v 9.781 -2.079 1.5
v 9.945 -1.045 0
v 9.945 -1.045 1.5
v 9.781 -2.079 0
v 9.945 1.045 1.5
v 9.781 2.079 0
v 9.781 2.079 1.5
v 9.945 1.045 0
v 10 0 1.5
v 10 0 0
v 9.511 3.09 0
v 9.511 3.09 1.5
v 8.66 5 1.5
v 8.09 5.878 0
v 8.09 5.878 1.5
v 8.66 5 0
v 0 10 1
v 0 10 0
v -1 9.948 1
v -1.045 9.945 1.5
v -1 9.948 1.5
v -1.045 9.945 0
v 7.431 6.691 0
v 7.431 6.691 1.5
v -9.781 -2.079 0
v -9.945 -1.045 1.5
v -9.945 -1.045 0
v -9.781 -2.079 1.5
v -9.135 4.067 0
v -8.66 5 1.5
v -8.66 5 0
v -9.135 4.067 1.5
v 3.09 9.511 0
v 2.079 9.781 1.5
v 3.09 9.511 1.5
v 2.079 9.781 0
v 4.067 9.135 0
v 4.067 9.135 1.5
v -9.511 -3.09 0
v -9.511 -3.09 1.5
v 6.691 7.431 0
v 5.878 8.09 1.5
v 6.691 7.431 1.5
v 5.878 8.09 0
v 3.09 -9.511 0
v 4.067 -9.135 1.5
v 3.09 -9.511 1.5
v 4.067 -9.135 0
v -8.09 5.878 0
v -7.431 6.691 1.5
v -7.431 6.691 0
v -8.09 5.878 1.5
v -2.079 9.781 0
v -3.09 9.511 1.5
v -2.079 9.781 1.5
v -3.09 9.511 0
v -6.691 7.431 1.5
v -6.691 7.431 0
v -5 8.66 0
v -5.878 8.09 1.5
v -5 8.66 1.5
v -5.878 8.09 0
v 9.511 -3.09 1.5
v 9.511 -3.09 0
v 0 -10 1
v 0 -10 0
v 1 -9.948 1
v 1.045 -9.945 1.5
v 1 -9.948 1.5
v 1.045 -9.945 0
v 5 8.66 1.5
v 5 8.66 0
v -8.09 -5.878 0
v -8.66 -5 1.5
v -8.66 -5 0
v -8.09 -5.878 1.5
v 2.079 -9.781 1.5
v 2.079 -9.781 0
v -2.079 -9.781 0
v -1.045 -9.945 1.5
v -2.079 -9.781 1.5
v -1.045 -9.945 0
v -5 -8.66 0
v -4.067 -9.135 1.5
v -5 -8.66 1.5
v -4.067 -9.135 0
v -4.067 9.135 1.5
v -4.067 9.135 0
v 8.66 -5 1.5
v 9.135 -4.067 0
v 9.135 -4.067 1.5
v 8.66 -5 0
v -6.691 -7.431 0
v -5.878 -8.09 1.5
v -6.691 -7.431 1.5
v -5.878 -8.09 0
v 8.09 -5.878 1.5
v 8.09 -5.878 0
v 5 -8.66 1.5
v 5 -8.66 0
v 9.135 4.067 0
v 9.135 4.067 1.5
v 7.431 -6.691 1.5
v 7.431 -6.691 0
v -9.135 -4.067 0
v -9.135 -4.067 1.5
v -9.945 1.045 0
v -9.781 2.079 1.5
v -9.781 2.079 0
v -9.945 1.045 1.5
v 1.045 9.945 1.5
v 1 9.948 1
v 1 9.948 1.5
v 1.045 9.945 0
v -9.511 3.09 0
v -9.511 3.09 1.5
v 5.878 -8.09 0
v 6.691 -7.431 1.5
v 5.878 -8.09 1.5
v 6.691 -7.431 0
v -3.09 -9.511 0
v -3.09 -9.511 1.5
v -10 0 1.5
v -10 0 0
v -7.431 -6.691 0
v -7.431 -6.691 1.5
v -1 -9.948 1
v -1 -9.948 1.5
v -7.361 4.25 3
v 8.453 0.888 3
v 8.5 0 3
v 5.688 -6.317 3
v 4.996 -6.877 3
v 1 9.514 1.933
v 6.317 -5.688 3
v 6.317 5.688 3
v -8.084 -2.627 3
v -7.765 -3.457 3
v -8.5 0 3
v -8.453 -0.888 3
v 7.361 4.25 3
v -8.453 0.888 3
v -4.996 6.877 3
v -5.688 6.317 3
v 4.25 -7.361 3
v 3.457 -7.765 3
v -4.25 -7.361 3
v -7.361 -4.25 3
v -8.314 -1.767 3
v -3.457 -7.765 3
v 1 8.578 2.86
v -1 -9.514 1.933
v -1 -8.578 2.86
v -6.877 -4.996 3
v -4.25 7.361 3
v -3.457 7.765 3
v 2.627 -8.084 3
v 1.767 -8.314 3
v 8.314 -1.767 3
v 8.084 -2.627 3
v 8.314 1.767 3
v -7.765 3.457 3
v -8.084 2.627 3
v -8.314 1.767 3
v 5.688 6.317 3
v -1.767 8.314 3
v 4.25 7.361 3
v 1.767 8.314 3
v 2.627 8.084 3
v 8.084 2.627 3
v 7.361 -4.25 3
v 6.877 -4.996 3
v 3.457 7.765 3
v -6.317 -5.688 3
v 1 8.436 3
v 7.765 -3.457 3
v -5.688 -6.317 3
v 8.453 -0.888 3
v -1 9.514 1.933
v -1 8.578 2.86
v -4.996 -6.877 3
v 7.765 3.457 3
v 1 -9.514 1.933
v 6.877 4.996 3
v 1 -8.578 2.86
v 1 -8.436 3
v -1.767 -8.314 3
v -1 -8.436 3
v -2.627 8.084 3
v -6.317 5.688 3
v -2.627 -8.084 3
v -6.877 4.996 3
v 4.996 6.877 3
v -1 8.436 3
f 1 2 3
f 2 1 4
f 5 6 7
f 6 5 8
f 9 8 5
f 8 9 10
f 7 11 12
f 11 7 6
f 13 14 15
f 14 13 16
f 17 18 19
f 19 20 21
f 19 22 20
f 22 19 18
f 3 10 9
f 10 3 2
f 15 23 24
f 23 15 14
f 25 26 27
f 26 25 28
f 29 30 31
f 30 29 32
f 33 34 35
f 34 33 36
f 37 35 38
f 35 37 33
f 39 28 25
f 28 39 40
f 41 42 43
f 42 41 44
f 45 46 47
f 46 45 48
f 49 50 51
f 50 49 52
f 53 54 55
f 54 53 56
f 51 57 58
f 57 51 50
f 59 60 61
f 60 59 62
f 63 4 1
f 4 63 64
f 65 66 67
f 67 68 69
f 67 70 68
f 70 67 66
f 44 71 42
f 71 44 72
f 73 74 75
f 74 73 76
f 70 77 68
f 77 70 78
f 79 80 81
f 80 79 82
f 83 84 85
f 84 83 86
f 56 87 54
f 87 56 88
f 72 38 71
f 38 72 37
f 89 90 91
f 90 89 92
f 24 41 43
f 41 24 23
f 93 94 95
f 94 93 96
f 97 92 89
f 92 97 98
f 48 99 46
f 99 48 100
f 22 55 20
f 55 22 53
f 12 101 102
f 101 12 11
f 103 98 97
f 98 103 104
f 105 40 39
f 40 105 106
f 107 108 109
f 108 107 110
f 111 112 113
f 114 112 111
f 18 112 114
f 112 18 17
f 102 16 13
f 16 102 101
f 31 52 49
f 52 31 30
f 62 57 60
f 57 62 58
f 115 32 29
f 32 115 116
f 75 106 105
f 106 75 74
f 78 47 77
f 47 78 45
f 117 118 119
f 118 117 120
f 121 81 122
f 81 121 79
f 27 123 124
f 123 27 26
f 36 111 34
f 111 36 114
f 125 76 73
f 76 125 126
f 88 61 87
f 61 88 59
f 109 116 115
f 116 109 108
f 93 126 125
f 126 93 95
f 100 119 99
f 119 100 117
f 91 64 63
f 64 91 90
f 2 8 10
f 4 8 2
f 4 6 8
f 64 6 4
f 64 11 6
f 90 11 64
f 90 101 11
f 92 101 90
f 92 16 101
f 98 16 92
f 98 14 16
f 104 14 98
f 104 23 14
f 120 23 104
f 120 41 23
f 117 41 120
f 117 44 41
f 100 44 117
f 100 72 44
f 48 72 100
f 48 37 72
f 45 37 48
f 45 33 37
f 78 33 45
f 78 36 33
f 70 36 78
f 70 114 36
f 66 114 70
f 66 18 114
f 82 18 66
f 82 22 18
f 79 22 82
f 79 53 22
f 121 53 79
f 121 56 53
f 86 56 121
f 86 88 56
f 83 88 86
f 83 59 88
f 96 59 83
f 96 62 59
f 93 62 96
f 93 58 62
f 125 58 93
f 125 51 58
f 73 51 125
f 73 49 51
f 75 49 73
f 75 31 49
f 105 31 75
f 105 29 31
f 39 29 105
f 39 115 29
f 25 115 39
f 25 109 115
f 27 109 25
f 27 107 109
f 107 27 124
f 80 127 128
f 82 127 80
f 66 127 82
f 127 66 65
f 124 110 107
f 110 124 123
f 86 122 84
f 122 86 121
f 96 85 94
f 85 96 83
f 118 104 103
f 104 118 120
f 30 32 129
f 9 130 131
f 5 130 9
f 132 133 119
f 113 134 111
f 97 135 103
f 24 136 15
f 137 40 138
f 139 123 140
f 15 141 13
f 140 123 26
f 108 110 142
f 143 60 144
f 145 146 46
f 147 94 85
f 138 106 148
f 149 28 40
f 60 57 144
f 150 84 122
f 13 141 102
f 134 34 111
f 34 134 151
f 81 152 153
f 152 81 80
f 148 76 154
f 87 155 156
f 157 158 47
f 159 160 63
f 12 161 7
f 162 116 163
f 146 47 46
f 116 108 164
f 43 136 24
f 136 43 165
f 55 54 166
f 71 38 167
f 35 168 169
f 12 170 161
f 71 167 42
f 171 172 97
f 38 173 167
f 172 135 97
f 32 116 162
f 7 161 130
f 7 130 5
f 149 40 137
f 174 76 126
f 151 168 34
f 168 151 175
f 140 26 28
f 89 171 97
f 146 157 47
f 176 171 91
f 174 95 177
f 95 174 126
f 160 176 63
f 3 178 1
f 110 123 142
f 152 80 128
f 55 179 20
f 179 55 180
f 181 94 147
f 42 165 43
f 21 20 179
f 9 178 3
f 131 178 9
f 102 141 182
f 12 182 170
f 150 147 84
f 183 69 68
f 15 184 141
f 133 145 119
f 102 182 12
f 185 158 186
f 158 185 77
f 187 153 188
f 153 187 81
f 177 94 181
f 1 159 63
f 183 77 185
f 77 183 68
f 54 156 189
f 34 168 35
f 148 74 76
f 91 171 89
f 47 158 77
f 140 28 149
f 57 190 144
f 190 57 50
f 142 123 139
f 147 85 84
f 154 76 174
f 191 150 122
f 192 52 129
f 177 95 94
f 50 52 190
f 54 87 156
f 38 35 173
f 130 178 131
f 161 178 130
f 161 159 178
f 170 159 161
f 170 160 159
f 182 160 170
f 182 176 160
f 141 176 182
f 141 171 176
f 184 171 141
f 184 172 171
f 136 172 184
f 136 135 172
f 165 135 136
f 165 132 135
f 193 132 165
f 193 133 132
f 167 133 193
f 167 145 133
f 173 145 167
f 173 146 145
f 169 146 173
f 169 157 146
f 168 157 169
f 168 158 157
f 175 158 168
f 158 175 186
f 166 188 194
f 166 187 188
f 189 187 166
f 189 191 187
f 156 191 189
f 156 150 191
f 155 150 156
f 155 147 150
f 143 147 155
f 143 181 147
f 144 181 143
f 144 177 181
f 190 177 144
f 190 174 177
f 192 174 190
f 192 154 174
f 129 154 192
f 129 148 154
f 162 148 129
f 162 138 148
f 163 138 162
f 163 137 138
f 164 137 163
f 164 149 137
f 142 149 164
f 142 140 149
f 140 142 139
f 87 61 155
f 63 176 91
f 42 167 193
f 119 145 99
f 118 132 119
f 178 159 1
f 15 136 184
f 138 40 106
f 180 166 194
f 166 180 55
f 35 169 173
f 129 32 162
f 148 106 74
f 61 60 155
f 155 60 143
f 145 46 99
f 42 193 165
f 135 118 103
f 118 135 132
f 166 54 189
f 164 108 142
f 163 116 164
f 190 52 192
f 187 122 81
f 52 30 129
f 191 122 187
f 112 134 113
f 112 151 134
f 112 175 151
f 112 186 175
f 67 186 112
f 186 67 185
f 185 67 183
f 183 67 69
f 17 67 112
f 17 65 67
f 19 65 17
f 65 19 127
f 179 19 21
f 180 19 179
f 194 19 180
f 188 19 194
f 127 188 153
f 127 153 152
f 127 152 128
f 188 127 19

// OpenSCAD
// Title: Mini Base
// Author: http://www.thingiverse.com/Jinja
// Date: 29/12/2016

/////////// START OF PARAMETERS /////////////////


base_diam = 20; // [10:Tiny, 20:Medium, 40:Large, 60:Huge: 80:Gargantuan]
slot_width = 2;
//base_diam = 20;
//base_diam = 10;
multi_slots = 0; // [1:MultiSlots, 0:SingleSlot]

base_or_mini = 0; // [0:Base, 1:Mini]

//silhouette_filename = "minibase40_bear.dat"; // [image_surface:100x100]
//silhouette_filename = "minibase40_spider.dat"; // [image_surface:100x100]
//silhouette_filename = "minibase40_wolf.dat"; // [image_surface:100x100]
//silhouette_filename = "minibase40_warhorse.dat"; // [image_surface:100x100]
//silhouette_filename = "minibase40_tiger.dat"; // [image_surface:100x100]
silhouette_filename = "minibase40_halfling.dat"; // [image_surface:100x100]

silhouette_scale = 1.0; // warhorse 40
//silhouette_scale = 0.7; // bear 20
//silhouette_scale = 1.2; // bear 40
//silhouette_scale = 1.0; // spider 40
//silhouette_scale = 0.5; // spider 20
//silhouette_scale = 0.3; // spider 10
//silhouette_scale = 1.4; // wolf 40
//silhouette_scale = 0.7; // wolf 20
//silhouette_scale = 1.2; // tiger 40
//silhouette_scale = 0.65; // tiger 20
//silhouette_scale = 0.6; // halfling 20


/////////// END OF PARAMETERS /////////////////
rounded = 1*1;    // the mm width of the bevelled edge

$fs=0.3*1;
$fa=6*1; //smooth
//$fa=20; //rough
pi = 3.1415927 * 1.0;

silhouette_width = 0.3*6.0; // 

if(base_or_mini==0)
{
    Base(base_diam);
}
else
{
    //translate([-1,0,3])
    //rotate([90,0,90])
    Silhouette(silhouette_width);
}

module Silhouette(width)
{
    scale([silhouette_scale,silhouette_scale,width/2.0])
    
    intersection()
    {
        translate([0,0,-15])
        scale([0.5,0.5,30])
        surface(file=silhouette_filename);
        
        cube([150,150,2.0]);
    }
    
    //translate([0,0,1.03])
    //union()
    //{
    //    Image();
    //    scale([1,1,-1])    
    //    Image();
    //}
}

module Image()
{
    difference()
    {
        translate([0,0,-0.03])
        scale([0.5,0.5,1])
        surface(file=silhouette_filename);
        translate([-2,-2,-2])
        cube([150,150,2]);        
    }
    
}



module Base(base_diam)
{
	card = 0.0;
	rad=base_diam/2.0;
    difference()
    {
        union()
        {
            cylinder( 1.5, rad, rad );
            translate( [0,0,1.5] )
            cylinder( 1.5, rad, rad-1.5 );
        }
        if(multi_slots==0)
        {
            Slit(base_diam);
        }
        else
        {
            count=floor(((base_diam/2)-4) / (2*slot_width));
            for (i = [-count : 1 : count]) 
            {
                x=i*2*slot_width;
                translate([x,0,0])
                Slit(base_diam);
            }
        }
    }
}

module Slit(base_diam)
{
    translate([0,0,2.5])
    cube([slot_width,base_diam,3],true);
}

